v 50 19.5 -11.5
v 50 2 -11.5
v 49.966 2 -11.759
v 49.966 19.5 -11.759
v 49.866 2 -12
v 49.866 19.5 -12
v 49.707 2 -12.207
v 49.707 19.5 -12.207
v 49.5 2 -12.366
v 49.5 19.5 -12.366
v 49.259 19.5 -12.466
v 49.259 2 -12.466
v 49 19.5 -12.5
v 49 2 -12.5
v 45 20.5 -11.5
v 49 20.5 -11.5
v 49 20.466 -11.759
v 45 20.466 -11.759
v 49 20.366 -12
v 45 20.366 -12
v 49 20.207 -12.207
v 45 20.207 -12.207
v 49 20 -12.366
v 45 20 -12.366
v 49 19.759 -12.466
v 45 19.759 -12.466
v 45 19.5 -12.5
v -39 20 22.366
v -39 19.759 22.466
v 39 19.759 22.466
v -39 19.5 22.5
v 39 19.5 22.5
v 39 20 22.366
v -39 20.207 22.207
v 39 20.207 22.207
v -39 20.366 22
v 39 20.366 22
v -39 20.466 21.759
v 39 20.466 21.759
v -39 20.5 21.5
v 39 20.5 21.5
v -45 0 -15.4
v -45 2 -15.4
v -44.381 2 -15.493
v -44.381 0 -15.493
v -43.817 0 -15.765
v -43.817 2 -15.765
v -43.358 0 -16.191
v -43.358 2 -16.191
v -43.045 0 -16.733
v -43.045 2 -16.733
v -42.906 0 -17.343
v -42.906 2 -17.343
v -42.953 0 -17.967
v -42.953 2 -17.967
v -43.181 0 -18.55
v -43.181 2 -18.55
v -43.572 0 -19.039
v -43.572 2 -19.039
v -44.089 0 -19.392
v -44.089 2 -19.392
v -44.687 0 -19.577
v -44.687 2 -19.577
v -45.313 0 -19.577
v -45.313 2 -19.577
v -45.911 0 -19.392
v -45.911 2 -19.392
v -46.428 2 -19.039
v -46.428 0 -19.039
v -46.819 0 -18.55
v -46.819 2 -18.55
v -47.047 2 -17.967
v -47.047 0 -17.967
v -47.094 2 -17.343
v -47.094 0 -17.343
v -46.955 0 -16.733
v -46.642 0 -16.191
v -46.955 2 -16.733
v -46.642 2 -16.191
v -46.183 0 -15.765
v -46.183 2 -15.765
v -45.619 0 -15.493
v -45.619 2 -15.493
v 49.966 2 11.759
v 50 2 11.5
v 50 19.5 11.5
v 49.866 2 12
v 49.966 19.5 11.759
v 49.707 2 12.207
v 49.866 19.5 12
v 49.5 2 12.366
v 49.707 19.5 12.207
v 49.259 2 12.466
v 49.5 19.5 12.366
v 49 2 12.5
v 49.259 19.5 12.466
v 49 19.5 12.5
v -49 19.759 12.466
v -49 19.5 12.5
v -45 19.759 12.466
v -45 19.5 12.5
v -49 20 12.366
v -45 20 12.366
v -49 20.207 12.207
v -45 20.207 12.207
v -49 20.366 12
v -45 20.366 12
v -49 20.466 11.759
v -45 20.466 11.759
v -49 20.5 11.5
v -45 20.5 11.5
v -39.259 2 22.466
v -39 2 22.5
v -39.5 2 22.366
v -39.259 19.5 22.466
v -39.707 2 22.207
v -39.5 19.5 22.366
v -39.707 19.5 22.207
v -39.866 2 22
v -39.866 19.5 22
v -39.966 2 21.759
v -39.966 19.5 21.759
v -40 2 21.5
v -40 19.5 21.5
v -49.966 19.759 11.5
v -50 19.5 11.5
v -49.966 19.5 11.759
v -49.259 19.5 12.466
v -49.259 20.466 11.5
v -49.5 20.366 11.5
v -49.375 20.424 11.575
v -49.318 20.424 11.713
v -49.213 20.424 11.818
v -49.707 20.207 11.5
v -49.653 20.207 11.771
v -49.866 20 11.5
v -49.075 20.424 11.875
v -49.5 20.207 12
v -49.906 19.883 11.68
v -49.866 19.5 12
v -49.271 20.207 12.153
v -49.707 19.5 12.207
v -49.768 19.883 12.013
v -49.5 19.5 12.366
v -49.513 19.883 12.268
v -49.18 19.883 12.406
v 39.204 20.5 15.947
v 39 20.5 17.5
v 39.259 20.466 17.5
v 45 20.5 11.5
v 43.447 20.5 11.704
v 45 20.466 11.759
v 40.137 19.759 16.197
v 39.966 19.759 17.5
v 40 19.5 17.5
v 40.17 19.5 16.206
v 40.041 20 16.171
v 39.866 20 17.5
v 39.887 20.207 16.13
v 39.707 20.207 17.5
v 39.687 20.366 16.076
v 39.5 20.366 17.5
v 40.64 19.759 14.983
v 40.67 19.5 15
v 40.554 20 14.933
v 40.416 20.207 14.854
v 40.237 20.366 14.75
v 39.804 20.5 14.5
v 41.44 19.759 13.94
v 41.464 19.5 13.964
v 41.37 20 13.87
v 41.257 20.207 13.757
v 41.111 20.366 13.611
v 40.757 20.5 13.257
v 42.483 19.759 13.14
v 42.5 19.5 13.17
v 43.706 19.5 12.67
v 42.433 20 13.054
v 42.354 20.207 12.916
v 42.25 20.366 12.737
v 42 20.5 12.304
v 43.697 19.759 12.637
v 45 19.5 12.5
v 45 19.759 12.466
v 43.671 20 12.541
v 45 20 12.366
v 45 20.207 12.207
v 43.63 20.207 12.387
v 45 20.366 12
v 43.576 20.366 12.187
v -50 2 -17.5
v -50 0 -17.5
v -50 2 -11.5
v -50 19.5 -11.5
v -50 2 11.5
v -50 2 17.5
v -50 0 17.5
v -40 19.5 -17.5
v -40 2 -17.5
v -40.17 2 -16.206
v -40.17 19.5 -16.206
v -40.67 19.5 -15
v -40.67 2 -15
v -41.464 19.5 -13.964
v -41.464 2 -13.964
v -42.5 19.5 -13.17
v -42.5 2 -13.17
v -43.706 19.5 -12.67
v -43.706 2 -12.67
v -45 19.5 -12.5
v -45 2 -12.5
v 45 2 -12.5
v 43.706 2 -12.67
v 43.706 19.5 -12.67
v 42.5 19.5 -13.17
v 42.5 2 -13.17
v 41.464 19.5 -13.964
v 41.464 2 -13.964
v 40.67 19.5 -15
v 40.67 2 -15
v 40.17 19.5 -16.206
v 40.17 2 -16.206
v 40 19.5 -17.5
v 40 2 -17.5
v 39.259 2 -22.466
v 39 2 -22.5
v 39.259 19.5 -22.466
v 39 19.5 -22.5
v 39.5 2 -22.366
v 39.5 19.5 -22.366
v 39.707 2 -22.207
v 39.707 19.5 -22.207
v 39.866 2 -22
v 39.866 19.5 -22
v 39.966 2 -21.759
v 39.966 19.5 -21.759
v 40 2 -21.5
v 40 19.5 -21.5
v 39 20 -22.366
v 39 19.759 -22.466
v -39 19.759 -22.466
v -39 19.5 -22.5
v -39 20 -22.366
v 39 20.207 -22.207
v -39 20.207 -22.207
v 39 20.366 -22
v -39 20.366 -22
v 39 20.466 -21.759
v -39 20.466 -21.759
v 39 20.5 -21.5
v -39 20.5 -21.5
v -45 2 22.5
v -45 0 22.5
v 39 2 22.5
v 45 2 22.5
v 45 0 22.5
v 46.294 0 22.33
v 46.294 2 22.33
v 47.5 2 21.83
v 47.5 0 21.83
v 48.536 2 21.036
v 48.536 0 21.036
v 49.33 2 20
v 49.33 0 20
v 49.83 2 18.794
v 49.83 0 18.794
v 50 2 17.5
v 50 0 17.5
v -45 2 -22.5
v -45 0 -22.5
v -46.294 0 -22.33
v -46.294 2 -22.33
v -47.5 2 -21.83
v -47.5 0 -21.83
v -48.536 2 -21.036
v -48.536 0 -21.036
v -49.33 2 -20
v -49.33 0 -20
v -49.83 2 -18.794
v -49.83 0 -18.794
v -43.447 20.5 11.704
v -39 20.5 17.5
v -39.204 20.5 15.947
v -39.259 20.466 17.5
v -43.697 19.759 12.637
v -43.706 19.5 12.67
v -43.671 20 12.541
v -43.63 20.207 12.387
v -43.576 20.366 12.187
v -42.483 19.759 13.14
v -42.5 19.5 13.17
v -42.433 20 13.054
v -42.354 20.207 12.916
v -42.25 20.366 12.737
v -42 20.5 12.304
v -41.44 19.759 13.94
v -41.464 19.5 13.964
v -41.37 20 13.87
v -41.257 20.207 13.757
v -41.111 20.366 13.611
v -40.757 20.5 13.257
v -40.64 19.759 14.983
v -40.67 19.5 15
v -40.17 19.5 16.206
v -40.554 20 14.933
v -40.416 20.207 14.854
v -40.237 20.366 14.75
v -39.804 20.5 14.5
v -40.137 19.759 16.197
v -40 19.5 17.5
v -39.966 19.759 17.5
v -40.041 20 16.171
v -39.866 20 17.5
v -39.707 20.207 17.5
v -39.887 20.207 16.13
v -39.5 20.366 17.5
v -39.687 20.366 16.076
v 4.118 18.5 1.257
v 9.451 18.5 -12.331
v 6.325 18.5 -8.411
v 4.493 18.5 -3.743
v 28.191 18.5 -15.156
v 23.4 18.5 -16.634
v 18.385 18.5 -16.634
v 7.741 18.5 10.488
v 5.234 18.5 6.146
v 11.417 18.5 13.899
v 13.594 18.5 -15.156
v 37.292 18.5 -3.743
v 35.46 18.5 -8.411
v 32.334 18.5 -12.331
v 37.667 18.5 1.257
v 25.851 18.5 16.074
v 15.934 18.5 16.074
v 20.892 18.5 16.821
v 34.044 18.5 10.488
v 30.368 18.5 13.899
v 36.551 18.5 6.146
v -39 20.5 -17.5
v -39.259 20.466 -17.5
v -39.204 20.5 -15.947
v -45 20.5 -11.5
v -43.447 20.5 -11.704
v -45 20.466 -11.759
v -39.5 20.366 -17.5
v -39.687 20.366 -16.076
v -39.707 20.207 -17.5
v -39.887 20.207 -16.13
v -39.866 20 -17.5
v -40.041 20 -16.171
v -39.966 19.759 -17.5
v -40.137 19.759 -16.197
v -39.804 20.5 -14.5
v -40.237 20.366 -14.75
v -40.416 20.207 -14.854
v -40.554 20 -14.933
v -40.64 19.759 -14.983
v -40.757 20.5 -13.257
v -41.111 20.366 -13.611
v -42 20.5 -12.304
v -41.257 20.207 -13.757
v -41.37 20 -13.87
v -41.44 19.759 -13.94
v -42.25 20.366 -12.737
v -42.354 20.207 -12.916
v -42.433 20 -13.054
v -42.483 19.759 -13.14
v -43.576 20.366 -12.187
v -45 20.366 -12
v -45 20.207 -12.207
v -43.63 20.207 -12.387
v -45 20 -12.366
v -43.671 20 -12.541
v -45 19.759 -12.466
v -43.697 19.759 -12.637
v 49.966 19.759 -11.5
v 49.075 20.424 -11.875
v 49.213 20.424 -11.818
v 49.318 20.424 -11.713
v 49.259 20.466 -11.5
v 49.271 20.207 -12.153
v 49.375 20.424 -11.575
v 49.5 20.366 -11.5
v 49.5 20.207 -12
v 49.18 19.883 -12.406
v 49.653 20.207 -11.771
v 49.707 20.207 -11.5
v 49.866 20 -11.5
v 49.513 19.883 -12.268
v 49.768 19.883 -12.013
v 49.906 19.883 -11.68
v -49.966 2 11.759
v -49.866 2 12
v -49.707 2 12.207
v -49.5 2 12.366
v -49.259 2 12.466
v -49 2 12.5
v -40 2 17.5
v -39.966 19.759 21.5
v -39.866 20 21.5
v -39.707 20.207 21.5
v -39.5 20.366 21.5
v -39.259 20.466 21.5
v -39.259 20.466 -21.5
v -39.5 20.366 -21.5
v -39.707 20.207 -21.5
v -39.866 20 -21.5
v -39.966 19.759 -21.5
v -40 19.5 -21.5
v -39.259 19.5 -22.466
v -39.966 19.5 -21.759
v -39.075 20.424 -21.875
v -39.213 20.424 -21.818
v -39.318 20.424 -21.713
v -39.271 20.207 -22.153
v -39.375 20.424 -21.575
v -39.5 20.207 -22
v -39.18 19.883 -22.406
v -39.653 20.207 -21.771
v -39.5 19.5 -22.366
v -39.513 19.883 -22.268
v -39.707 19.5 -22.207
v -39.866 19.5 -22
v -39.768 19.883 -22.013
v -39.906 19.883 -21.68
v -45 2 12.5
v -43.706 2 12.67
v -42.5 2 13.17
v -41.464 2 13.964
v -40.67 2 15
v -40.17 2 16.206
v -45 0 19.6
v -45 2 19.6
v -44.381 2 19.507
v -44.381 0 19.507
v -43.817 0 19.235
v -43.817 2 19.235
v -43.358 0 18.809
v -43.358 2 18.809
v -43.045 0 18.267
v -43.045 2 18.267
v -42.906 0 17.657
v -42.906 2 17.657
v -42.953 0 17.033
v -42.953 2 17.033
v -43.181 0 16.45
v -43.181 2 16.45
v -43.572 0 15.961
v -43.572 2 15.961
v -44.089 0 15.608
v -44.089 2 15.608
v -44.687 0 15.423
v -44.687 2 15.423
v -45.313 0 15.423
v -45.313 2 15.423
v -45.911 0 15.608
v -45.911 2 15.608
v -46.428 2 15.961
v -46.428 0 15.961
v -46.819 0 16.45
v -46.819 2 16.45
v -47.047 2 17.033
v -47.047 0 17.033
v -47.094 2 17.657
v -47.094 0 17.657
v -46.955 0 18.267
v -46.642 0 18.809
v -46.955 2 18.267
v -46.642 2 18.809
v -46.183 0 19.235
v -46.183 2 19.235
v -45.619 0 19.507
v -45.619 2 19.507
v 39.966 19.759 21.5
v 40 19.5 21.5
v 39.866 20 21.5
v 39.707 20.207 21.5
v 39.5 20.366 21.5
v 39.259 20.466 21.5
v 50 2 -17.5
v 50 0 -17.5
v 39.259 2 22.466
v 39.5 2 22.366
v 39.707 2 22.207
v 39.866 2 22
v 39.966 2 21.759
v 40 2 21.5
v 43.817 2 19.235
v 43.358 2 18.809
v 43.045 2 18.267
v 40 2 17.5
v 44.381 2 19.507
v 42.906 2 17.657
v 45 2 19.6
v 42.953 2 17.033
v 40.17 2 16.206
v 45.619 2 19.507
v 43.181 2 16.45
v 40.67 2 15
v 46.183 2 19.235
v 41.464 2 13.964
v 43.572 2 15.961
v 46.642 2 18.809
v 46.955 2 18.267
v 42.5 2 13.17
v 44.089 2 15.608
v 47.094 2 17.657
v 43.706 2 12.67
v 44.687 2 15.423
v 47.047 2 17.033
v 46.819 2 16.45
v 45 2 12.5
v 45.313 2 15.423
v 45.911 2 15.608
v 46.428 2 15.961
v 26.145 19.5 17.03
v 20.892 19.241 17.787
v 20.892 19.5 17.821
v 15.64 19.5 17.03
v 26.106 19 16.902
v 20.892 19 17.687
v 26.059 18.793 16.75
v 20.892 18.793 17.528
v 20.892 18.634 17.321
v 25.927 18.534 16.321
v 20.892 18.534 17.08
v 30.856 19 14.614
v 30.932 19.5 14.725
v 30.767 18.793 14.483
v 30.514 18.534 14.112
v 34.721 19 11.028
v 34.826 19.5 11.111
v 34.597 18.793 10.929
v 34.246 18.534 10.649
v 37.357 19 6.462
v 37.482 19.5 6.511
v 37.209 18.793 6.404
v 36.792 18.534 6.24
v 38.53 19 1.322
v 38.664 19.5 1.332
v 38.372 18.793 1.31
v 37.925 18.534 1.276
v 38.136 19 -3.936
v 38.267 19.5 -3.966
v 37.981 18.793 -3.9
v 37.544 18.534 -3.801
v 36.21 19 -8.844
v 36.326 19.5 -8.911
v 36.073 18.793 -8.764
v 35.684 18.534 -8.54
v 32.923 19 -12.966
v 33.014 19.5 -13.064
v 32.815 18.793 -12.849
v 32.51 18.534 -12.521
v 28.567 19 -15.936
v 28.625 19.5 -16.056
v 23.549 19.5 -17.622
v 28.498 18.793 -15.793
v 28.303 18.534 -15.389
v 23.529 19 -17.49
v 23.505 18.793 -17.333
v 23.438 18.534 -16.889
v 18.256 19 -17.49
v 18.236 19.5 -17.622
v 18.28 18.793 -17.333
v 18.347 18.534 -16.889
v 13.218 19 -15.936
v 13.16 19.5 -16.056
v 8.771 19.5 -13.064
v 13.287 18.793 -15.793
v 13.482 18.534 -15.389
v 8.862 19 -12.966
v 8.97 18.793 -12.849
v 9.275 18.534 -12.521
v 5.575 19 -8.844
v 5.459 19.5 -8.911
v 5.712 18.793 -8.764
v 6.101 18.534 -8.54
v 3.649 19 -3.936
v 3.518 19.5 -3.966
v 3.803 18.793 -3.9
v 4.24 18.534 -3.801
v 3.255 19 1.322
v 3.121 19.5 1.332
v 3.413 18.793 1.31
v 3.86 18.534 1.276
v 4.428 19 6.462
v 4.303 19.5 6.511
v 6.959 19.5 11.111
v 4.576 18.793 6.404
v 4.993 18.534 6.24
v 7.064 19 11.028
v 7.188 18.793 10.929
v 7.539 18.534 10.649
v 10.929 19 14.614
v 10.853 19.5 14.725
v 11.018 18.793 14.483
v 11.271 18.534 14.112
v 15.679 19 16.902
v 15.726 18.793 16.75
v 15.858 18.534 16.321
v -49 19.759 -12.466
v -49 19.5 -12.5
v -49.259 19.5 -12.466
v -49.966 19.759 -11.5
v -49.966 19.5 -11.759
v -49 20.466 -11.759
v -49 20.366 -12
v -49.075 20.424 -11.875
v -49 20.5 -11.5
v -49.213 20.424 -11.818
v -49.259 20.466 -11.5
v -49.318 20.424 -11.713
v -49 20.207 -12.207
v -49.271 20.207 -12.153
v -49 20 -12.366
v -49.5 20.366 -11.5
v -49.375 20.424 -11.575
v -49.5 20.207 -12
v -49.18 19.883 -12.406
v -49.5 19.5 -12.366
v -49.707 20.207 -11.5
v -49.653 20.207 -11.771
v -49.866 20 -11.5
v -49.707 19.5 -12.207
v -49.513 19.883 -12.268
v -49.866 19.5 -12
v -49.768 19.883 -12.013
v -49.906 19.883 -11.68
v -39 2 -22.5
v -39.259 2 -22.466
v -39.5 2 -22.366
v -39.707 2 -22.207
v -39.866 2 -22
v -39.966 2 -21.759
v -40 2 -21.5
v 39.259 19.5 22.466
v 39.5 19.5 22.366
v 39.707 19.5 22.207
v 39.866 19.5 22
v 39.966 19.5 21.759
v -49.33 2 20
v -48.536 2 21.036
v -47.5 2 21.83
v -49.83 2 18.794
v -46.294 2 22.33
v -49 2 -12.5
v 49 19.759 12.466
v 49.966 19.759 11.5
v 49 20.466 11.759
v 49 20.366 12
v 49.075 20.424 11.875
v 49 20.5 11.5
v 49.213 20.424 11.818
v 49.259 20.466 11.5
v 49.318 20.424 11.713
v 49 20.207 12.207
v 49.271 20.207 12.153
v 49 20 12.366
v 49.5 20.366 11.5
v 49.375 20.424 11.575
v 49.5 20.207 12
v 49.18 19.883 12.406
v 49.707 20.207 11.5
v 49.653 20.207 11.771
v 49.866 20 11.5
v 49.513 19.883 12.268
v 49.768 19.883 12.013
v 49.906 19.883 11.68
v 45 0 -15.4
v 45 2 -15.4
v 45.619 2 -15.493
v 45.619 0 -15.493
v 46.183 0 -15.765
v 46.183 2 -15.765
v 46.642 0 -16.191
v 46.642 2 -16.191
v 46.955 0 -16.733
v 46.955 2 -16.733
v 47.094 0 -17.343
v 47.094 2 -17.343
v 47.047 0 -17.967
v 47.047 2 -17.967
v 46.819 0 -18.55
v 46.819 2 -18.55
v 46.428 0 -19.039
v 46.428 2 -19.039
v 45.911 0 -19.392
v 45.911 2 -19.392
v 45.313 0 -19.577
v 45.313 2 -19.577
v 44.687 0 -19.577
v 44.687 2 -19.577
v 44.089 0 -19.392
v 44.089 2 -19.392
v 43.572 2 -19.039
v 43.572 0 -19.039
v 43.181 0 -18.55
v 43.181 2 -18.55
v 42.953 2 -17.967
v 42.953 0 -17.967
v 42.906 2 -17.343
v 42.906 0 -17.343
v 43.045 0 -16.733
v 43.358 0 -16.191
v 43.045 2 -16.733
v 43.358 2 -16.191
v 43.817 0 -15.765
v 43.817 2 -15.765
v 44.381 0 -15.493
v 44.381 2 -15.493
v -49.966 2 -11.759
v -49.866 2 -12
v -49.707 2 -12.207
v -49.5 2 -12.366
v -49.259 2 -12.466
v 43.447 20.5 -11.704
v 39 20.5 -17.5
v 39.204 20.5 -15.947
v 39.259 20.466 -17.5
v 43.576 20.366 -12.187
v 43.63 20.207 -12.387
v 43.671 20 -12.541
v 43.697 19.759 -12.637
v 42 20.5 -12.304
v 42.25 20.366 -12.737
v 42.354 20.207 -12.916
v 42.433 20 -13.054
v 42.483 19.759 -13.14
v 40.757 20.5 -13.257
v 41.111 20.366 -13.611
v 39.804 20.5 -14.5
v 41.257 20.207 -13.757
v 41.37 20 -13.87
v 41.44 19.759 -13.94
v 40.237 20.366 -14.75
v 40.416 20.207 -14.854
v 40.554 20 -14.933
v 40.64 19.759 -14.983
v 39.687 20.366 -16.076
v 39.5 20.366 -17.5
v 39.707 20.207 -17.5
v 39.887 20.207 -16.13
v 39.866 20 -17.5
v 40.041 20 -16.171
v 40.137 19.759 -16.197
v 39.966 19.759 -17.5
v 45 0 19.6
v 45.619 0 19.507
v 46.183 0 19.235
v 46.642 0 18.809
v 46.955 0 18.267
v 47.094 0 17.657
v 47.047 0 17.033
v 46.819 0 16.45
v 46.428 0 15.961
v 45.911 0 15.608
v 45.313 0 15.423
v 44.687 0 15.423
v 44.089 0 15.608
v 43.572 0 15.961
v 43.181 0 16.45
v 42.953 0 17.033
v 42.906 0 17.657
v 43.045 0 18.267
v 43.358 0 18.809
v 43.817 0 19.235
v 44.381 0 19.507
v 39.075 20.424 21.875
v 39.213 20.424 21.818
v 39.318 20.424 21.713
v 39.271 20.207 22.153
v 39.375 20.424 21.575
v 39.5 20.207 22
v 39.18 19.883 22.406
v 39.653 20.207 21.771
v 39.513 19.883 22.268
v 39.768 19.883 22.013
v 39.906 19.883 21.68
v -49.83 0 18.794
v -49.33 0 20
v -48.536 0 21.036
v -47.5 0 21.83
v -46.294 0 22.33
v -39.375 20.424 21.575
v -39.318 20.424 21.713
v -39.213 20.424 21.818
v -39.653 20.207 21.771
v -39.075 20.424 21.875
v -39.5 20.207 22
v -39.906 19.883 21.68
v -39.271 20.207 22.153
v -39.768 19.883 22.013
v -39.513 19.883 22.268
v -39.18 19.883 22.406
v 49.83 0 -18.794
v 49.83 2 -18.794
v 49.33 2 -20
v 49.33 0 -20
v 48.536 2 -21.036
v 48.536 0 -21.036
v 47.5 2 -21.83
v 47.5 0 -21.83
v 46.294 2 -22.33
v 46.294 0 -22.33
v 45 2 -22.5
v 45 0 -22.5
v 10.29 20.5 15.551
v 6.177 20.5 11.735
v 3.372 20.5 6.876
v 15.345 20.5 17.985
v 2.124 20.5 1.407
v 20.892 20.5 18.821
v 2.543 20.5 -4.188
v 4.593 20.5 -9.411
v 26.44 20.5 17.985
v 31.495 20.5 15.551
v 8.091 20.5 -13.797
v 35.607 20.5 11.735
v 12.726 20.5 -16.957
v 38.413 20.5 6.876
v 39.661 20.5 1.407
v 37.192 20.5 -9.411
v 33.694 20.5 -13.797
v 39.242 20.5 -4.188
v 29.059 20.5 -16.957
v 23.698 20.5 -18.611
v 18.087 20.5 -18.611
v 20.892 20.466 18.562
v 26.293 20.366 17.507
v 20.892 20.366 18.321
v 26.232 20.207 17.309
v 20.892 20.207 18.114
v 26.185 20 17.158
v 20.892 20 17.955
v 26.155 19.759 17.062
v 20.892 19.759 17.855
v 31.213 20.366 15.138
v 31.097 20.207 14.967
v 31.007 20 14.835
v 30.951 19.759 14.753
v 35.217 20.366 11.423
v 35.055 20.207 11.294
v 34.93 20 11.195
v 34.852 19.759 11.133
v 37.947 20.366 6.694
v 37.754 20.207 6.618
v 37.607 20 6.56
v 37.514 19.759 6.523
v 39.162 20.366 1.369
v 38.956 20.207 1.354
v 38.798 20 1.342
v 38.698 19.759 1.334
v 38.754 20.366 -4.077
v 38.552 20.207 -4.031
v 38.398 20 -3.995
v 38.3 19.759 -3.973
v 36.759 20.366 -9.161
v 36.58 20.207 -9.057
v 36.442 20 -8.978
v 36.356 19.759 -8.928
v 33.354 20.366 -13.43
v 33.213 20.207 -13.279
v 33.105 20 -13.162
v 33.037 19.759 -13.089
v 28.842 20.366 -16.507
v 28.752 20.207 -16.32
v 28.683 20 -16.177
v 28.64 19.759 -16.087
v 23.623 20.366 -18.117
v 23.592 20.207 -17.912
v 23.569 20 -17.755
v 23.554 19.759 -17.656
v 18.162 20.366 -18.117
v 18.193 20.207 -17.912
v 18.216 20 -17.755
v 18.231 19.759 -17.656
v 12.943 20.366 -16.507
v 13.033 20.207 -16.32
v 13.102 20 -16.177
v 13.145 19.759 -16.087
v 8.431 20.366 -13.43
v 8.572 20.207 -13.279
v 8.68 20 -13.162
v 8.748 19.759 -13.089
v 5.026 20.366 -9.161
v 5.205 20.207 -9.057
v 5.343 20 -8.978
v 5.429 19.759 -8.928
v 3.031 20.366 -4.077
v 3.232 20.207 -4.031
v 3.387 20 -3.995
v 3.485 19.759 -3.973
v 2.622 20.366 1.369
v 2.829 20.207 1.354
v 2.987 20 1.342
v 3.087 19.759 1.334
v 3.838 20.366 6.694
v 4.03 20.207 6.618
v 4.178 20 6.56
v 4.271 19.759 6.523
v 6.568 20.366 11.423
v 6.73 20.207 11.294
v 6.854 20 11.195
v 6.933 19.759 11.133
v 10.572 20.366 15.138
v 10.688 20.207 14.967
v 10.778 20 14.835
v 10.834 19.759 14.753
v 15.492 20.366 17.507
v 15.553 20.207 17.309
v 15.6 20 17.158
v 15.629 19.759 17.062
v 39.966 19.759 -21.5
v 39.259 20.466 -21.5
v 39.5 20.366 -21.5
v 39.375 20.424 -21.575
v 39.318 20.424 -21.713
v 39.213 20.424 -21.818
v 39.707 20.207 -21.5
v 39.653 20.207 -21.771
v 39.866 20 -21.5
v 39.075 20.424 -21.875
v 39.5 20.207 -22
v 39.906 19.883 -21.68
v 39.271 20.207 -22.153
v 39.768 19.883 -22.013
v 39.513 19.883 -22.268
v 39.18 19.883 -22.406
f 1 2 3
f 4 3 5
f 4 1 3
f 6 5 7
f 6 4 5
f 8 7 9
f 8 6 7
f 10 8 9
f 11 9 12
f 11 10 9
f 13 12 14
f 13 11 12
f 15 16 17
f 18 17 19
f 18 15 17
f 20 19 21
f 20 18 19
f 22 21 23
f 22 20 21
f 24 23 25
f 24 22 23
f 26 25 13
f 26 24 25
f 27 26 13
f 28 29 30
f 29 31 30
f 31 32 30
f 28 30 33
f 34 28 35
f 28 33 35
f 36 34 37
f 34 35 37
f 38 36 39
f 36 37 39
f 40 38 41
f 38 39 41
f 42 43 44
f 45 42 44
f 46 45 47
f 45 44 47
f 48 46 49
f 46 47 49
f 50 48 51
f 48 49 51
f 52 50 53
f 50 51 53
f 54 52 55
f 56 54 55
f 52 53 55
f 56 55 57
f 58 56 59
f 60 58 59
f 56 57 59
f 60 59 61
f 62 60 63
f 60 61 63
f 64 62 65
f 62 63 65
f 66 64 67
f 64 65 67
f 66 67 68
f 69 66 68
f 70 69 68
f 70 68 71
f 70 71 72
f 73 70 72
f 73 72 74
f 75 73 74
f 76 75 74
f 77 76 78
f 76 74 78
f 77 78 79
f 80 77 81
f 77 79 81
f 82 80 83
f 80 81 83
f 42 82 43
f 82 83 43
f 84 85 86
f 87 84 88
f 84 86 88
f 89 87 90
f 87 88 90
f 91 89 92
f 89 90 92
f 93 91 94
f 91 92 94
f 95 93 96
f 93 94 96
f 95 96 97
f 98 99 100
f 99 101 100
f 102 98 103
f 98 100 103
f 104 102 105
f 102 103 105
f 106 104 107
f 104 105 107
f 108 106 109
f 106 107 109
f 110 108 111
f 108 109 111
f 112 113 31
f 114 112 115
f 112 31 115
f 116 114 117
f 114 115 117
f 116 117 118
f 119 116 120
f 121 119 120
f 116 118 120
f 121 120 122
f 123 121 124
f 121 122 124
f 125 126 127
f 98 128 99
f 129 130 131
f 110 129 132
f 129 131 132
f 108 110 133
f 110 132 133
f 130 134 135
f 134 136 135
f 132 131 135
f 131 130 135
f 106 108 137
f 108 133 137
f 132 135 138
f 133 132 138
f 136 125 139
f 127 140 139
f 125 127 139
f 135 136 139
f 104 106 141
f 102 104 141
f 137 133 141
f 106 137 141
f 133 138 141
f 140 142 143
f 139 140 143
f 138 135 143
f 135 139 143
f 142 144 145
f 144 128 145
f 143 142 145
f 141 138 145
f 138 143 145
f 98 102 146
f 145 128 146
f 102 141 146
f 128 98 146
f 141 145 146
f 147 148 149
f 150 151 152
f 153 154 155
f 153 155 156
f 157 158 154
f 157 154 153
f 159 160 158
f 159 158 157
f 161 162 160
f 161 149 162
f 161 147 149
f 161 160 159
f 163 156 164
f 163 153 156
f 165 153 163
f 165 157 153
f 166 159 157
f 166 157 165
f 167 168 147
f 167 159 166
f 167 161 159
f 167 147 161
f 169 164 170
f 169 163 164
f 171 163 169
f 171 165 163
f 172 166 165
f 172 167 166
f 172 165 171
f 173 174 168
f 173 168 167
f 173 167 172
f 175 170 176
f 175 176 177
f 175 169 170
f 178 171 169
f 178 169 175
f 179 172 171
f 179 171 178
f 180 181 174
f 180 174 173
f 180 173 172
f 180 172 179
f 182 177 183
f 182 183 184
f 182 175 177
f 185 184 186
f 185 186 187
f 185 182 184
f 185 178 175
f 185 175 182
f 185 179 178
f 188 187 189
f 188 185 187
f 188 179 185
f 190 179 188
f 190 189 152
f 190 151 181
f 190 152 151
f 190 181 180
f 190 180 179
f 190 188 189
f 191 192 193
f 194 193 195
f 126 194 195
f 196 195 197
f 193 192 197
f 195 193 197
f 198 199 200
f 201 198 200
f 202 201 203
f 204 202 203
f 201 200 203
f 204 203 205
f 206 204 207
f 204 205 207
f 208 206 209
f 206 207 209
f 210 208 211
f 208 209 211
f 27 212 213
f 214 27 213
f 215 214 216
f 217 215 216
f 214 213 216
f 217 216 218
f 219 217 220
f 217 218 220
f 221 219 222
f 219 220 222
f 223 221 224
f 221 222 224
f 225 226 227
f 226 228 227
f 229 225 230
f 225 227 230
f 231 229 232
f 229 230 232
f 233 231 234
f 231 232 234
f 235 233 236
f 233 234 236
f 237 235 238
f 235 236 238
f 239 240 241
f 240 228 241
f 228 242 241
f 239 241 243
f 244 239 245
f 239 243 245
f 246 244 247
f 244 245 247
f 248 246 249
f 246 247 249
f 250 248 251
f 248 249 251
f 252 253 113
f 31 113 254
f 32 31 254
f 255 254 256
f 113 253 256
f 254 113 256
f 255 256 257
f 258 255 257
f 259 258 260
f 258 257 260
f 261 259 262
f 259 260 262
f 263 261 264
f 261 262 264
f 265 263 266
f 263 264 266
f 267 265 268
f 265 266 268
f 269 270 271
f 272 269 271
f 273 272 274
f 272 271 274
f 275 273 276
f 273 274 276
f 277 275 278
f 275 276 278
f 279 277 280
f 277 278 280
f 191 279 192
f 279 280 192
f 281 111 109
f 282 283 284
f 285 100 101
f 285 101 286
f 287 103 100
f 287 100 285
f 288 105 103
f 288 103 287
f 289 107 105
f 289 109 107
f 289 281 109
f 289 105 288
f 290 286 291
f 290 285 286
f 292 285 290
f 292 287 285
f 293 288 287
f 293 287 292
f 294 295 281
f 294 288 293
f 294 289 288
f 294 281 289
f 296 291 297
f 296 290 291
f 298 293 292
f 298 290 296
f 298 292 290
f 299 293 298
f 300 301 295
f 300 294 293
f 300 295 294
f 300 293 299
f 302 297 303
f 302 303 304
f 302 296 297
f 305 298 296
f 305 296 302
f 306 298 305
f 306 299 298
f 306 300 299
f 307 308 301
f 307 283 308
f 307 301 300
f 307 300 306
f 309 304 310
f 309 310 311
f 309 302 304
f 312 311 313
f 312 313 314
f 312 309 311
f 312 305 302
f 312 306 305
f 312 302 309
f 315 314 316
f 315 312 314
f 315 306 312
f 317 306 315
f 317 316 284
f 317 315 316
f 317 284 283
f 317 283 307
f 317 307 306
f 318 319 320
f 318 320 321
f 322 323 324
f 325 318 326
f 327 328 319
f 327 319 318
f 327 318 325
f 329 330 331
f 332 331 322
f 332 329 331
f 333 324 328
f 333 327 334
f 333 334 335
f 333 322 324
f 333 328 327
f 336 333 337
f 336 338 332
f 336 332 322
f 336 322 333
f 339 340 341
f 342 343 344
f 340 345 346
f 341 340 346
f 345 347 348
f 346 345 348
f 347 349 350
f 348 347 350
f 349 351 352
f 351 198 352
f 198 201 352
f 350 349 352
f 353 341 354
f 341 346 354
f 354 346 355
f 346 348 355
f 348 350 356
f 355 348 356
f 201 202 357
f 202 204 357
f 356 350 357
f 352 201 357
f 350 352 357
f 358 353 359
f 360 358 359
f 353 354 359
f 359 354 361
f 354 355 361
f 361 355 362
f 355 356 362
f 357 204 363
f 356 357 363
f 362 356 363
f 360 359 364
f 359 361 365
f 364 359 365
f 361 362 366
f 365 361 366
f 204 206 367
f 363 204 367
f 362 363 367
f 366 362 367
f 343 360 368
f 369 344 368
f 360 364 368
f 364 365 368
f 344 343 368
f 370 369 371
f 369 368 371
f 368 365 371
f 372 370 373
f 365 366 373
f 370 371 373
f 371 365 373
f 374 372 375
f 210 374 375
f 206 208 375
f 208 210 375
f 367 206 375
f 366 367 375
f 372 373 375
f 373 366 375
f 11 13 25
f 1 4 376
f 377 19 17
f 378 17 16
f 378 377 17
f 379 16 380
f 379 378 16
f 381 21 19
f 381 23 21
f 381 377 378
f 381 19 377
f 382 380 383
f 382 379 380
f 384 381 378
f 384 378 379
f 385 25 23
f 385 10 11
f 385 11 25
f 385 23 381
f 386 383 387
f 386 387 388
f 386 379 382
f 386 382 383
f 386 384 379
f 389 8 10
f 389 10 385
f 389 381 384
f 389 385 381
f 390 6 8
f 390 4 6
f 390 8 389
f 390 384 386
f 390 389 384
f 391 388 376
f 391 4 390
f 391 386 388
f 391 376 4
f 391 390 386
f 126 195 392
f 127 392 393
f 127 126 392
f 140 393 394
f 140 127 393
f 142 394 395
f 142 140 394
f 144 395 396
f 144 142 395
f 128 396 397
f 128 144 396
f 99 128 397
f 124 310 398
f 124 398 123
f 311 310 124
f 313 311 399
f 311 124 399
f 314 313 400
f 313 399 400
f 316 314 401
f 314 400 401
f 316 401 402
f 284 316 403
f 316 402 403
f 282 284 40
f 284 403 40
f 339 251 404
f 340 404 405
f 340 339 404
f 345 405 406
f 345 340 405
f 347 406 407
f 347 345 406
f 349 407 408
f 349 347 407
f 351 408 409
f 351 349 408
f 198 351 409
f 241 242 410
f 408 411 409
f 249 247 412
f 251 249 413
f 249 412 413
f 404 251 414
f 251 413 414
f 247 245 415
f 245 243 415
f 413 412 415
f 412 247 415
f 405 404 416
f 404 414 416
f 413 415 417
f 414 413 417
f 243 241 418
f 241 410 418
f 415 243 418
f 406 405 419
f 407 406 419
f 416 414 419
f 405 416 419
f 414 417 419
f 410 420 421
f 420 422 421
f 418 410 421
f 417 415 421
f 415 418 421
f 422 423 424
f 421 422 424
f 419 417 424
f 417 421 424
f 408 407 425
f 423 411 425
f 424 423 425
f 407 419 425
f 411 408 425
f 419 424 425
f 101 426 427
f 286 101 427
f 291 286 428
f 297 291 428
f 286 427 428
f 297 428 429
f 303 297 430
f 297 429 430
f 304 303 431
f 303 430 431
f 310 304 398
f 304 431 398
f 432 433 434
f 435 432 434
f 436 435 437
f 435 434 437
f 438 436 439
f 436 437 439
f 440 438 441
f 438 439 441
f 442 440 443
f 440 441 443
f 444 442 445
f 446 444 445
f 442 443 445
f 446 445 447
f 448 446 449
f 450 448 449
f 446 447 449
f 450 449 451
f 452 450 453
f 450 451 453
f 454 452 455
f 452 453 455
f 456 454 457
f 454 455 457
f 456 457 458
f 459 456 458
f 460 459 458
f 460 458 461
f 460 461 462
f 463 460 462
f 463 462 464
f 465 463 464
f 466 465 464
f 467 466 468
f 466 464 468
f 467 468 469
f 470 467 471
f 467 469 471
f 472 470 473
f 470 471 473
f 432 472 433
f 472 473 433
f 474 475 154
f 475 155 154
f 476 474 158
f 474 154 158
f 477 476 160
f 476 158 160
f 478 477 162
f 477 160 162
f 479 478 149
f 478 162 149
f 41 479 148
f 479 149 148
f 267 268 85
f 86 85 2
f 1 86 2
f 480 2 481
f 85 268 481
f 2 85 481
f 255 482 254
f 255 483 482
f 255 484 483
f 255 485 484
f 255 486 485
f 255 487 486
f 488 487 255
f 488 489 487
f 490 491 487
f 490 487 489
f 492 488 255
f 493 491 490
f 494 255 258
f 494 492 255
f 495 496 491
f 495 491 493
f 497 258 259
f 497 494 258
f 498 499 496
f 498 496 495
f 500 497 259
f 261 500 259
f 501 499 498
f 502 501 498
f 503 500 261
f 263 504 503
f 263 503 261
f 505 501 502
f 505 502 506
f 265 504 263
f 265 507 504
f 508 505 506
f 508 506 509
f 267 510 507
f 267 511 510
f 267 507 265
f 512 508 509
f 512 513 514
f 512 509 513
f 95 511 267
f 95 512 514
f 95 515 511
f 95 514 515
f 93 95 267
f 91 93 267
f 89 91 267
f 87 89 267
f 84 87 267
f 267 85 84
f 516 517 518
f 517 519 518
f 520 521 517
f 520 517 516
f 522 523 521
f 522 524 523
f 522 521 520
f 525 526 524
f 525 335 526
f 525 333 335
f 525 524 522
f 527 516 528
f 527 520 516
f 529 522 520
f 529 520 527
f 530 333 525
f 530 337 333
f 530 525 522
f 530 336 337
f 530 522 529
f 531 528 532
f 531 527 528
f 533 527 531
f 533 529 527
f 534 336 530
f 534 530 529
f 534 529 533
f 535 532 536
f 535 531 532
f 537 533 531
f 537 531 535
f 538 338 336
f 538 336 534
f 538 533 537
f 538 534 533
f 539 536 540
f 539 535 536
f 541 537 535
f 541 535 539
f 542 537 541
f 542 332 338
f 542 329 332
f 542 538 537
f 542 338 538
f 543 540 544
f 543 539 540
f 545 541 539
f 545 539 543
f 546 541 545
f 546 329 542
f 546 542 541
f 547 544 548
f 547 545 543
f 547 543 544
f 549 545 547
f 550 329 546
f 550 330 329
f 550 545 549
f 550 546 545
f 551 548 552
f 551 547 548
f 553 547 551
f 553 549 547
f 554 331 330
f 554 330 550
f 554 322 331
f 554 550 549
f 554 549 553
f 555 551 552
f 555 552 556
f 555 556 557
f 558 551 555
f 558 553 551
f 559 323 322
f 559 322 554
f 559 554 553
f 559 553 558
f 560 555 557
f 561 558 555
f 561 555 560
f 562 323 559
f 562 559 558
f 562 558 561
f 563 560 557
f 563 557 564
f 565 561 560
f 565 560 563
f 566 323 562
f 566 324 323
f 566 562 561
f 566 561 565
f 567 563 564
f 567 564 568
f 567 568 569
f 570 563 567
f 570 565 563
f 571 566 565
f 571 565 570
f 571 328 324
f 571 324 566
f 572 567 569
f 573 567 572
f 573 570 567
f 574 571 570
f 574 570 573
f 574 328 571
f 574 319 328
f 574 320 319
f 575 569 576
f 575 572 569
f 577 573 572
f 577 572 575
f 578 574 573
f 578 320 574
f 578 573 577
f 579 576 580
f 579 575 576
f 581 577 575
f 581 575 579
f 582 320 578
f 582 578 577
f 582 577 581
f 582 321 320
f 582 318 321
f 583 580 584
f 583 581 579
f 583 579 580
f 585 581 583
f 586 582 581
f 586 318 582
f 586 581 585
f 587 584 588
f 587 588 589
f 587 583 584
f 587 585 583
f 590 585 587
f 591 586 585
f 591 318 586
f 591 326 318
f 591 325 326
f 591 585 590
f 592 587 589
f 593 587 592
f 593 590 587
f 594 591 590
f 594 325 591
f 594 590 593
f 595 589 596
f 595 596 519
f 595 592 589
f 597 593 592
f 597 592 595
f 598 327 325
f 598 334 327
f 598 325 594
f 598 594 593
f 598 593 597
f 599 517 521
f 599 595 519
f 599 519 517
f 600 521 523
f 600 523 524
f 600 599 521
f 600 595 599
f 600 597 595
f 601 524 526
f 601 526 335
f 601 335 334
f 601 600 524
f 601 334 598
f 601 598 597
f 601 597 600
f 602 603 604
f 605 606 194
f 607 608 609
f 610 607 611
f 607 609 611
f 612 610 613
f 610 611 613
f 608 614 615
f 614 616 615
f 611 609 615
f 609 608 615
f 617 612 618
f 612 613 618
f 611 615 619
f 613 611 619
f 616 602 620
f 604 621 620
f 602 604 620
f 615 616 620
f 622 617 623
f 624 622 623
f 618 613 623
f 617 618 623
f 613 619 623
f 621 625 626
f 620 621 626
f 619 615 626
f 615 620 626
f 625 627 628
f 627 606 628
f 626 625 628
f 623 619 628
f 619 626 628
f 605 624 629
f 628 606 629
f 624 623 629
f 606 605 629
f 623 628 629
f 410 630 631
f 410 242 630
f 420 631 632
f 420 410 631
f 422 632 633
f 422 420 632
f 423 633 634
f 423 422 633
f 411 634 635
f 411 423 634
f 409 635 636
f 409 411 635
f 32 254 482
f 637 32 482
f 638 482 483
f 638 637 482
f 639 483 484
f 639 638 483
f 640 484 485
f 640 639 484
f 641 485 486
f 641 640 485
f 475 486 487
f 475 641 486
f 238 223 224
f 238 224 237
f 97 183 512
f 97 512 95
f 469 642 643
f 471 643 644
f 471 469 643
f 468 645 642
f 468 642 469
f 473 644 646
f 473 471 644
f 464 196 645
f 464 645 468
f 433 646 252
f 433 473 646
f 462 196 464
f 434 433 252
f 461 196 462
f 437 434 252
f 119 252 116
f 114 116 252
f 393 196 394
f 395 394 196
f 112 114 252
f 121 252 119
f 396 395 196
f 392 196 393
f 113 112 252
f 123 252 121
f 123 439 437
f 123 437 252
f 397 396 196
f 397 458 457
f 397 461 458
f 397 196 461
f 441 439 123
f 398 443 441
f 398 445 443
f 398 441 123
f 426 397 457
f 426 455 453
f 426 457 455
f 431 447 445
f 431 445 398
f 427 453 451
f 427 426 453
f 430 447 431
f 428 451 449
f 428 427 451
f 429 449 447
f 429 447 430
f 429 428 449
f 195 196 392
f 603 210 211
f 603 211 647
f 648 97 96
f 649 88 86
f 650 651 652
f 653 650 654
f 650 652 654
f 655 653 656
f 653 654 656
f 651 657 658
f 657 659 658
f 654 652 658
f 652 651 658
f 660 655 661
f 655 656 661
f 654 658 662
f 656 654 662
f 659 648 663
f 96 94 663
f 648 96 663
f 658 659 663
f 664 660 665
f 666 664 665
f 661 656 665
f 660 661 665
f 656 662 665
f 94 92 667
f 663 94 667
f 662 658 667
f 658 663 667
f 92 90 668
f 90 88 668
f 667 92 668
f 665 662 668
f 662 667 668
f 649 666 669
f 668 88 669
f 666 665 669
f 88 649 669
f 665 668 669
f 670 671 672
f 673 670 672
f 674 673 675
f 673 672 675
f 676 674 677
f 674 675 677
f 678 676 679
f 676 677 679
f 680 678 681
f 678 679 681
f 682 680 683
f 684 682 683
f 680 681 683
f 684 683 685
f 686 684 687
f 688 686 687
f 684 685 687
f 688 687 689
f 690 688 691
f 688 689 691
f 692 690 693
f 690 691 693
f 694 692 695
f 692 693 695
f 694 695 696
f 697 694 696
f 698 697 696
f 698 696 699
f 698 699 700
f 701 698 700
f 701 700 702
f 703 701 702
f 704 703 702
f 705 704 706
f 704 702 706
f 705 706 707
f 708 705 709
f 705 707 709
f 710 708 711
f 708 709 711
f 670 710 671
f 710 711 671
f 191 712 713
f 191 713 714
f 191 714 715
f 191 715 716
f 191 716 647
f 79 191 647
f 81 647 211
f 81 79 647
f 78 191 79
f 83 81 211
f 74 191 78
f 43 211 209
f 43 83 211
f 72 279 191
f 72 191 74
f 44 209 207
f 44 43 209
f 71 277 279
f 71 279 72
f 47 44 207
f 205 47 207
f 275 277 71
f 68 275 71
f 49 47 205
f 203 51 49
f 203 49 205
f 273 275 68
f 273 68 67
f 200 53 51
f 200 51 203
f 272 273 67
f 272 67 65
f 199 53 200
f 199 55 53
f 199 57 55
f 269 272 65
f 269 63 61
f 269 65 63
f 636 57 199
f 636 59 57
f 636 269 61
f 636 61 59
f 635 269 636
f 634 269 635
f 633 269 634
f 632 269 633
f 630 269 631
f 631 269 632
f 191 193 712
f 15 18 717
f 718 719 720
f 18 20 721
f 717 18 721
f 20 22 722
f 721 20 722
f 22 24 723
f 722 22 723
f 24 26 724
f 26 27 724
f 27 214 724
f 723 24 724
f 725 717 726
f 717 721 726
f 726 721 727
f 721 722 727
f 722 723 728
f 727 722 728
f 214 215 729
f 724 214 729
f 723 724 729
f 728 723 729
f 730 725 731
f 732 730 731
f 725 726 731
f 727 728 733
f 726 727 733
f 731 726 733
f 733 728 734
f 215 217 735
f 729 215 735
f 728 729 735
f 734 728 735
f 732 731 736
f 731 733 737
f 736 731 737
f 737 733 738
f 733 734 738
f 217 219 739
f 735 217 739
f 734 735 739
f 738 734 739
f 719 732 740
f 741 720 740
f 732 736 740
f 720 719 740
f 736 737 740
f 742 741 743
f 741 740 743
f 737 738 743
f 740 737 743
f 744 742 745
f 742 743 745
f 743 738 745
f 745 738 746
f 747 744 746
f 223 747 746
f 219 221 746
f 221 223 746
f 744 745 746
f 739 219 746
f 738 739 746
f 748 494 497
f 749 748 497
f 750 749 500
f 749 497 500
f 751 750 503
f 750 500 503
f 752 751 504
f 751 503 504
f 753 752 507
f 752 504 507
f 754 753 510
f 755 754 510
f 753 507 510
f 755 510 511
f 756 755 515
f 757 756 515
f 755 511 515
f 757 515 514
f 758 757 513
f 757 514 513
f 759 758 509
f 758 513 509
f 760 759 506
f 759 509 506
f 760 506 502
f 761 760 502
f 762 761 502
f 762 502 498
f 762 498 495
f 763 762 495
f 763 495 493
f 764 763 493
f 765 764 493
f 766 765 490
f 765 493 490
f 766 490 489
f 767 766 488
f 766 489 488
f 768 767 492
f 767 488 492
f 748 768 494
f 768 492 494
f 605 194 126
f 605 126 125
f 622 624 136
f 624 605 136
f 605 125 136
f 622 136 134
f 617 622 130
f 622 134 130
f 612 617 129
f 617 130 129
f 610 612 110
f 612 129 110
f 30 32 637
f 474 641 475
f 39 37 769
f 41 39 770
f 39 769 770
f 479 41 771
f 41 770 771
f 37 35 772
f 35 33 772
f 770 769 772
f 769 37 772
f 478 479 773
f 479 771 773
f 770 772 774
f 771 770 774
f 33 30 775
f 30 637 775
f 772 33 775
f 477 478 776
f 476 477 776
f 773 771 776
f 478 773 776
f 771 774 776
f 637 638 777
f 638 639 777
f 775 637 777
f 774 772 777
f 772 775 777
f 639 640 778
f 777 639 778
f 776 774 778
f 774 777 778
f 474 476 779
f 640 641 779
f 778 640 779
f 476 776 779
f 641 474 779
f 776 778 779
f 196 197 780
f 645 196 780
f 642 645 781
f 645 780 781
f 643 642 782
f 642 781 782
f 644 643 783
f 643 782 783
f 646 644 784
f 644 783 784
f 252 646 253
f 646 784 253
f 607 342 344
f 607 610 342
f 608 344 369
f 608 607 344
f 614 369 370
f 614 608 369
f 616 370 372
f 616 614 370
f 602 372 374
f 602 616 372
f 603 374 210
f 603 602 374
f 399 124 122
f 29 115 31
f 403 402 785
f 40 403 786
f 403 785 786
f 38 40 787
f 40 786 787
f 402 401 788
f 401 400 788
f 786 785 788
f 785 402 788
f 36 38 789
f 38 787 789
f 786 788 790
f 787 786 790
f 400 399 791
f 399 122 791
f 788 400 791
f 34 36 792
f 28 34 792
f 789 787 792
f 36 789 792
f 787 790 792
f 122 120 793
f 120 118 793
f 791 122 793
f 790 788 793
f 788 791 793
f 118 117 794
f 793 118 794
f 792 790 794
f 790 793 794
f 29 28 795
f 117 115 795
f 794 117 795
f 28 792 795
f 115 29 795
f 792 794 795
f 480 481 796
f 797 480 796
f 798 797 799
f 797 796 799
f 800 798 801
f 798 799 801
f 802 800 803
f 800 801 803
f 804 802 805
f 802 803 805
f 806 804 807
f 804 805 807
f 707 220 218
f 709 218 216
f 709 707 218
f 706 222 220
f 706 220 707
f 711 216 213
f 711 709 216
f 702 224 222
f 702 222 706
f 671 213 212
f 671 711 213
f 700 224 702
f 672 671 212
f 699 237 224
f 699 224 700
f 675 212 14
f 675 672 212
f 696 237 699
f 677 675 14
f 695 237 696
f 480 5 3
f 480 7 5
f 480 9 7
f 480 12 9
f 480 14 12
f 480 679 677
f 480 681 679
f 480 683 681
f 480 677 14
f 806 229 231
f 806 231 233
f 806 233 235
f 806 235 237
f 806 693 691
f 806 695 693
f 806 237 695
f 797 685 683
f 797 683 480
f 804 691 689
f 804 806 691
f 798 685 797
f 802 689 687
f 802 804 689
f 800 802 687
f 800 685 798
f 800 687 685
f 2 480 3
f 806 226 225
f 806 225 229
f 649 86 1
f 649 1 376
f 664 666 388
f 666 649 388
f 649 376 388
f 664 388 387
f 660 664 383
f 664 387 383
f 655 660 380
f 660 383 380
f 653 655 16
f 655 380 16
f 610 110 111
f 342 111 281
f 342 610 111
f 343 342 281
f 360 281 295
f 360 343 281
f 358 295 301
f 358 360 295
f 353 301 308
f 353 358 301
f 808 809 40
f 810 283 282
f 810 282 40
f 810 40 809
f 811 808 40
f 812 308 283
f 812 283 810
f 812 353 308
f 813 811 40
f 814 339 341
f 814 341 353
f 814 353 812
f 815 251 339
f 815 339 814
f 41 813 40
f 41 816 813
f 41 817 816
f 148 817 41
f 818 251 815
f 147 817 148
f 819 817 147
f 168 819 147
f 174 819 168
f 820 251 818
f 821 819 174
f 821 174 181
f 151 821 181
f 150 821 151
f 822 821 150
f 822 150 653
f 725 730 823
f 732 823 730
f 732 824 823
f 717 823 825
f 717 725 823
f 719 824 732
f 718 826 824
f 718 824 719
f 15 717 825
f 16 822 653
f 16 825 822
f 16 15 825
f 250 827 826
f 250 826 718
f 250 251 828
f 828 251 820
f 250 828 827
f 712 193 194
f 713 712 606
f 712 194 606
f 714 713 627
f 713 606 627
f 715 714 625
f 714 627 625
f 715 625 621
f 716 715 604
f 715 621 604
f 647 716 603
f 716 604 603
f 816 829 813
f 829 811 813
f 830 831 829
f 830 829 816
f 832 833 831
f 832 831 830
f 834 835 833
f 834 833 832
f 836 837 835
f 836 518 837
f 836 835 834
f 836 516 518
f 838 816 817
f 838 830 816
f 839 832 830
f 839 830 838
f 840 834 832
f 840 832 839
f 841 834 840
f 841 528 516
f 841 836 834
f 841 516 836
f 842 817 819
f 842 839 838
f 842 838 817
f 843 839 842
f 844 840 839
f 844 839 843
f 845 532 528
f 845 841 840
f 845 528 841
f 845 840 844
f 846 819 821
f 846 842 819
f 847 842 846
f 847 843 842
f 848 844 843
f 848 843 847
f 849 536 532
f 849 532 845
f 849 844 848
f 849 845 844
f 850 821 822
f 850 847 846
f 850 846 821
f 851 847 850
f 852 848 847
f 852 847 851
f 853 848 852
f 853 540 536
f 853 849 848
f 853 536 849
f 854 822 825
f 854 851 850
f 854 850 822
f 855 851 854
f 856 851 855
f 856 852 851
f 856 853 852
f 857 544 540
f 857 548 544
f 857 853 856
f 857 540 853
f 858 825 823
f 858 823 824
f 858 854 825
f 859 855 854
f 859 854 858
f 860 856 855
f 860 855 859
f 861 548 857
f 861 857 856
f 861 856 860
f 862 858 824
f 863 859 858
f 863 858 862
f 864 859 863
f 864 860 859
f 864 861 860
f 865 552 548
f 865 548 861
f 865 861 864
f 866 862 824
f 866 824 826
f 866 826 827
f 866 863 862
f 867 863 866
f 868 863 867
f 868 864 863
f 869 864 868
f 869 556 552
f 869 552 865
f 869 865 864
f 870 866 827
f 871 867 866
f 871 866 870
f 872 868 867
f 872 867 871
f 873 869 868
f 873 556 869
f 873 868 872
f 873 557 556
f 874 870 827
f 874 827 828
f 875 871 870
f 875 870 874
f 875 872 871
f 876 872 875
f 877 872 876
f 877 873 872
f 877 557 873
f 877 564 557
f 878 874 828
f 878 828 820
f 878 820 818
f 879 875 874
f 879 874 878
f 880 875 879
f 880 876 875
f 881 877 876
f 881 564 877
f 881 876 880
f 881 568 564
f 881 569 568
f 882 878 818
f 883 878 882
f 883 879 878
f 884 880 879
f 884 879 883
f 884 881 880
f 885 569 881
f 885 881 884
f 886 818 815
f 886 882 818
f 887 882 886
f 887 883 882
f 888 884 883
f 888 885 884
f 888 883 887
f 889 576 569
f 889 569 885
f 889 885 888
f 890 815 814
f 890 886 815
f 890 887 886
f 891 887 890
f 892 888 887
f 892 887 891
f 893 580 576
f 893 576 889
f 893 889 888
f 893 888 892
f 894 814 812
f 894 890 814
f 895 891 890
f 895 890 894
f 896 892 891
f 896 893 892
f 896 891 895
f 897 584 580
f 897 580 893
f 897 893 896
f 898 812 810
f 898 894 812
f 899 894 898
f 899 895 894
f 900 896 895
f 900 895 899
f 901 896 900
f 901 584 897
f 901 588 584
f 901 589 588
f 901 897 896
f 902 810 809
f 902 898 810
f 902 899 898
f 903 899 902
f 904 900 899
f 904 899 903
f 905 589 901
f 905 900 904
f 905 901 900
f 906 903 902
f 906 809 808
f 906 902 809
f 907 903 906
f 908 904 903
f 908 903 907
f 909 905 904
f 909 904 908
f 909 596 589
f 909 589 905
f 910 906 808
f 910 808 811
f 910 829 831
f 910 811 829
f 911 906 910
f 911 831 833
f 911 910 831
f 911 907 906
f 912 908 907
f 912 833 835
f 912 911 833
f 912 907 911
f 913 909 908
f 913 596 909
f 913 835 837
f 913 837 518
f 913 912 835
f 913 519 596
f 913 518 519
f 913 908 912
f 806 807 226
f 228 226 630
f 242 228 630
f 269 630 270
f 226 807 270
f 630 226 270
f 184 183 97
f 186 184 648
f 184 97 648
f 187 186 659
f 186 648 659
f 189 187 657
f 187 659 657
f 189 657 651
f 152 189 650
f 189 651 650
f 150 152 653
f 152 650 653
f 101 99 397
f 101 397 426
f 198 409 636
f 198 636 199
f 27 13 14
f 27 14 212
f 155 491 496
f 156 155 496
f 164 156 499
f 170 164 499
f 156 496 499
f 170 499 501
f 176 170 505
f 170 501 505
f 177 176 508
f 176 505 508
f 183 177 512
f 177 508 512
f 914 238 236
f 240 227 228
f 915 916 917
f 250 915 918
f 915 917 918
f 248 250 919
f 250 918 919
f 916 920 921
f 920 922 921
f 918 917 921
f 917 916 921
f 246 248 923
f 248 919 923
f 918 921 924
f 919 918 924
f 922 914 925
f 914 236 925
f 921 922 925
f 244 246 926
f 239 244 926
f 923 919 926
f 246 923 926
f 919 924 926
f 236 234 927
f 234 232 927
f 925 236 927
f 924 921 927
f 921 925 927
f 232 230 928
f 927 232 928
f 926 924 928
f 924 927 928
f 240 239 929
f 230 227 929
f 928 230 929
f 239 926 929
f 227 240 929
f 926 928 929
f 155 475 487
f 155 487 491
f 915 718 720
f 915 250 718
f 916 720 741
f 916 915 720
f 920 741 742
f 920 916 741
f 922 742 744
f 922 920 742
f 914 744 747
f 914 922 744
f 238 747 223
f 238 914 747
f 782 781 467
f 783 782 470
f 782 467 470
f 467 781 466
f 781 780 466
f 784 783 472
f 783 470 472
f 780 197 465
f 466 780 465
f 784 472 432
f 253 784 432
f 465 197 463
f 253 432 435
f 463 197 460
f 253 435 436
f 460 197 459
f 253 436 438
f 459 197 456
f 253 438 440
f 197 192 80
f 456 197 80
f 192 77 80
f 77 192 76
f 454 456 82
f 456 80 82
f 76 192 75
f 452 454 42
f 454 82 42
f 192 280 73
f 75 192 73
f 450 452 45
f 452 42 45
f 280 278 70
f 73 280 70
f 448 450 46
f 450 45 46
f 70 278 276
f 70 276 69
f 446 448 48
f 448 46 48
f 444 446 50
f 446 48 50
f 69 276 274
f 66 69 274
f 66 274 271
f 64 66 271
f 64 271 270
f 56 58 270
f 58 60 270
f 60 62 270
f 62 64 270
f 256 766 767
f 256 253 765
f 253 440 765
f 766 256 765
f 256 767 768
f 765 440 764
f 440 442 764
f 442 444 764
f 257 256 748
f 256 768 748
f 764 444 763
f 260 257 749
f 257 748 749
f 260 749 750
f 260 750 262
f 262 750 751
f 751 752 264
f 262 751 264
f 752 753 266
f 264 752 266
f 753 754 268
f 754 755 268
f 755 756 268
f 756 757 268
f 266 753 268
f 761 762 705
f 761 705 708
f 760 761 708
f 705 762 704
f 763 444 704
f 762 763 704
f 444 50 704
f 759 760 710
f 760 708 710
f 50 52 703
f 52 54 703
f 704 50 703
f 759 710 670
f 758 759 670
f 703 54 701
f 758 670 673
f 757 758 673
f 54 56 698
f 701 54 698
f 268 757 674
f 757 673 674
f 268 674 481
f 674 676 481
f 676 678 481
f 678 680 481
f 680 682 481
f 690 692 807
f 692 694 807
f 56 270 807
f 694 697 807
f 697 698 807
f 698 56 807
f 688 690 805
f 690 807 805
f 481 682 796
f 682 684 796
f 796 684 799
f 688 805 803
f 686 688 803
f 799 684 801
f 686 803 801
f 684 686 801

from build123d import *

# Parameters (mm, degrees)
EXTRUDE_1_DEPTH     = 2
EXTRUDE_3_DEPTH     = 18.5
FILLET_1_R          = 1
SKETCH_4_R          = 17.821315346
CUT_EXTRUDE_1_DEPTH = 2
FILLET_2_R          = 1
SKETCH_5_R          = 2.1
CUT_EXTRUDE_2_DEPTH = 2


with BuildPart() as part:
    # 草图1 → 凸台-拉伸1 (new body)
    with BuildSketch(Plane(origin=(0, 0, 0), x_dir=(1, 0, 0), z_dir=(0, 1, 0))):
        with BuildLine():
            Line((-45, -22.5), (45, -22.5))
            ThreePointArc((45, -22.5), (48.535533906, -21.035533906), (50, -17.5))
            Line((50, -17.5), (50, 17.5))
            ThreePointArc((50, 17.5), (48.535533906, 21.035533906), (45, 22.5))
            Line((45, 22.5), (-45, 22.5))
            ThreePointArc((-45, 22.5), (-48.535533906, 21.035533906), (-50, 17.5))
            Line((-50, 17.5), (-50, -17.5))
            ThreePointArc((-50, -17.5), (-48.535533906, -21.035533906), (-45, -22.5))
        make_face()
    extrude(amount=EXTRUDE_1_DEPTH)

    # 草图2 → 凸台-拉伸3 (add)
    with BuildSketch(Plane(origin=(0, 2, 0), x_dir=(1, 0, 0), z_dir=(0, 1, 0))):
        with BuildLine():
            Line((-40, 22.5), (-40, 17.5))
            ThreePointArc((-40, 17.5), (-41.464466094, 13.964466094), (-45, 12.5))
            Line((-45, 12.5), (-50, 12.5))
            Line((-50, 12.5), (-50, -12.5))
            Line((-50, -12.5), (-45, -12.5))
            ThreePointArc((-45, -12.5), (-41.464466094, -13.964466094), (-40, -17.5))
            Line((-40, -17.5), (-40, -22.5))
            Line((-40, -22.5), (40, -22.5))
            Line((40, -22.5), (40, -17.5))
            ThreePointArc((40, -17.5), (41.464466094, -13.964466094), (45, -12.5))
            Line((45, -12.5), (50, -12.5))
            Line((50, -12.5), (50, 12.5))
            Line((50, 12.5), (45, 12.5))
            ThreePointArc((45, 12.5), (41.464466094, 13.964466094), (40, 17.5))
            Line((40, 17.5), (40, 22.5))
            Line((40, 22.5), (-40, 22.5))
        make_face()
    extrude(amount=EXTRUDE_3_DEPTH)

    # 圆角1
    fillet_1_edges = [part.edges().sort_by_distance(p)[0] for p in [
        (40, 11.25, -22.5),
        (-40, 11.25, -22.5),
        (-50, 11.25, -12.5),
        (-50, 11.25, 12.5),
        (-40, 11.25, 22.5),
        (40, 11.25, 22.5),
        (50, 11.25, 12.5),
        (50, 11.25, -12.5),
        (41.464466094, 20.5, -13.964466094),
        (40, 20.5, -20),
        (0, 20.5, -22.5),
        (-40, 20.5, -20),
        (-41.464466094, 20.5, -13.964466094),
        (-47.5, 20.5, -12.5),
        (-50, 20.5, 0),
        (-47.5, 20.5, 12.5),
        (-41.464466094, 20.5, 13.964466094),
        (-40, 20.5, 20),
        (0, 20.5, 22.5),
        (40, 20.5, 20),
        (41.464466094, 20.5, 13.964466094),
        (47.5, 20.5, 12.5),
        (50, 20.5, 0),
        (47.5, 20.5, -12.5),
    ]]
    fillet(fillet_1_edges, radius=FILLET_1_R)

    # 草图4 → 切除-拉伸1 (cut)
    with BuildSketch(Plane(origin=(0, 20.5, 0), x_dir=(1, 0, 0), z_dir=(0, 1, 0))):
        with Locations(Location((20.892434564, 0, 0), (0, 0, 270))):
            Circle(SKETCH_4_R)
    extrude(amount=-CUT_EXTRUDE_1_DEPTH, mode=Mode.SUBTRACT)

    # 圆角2
    fillet_2_edges = [part.edges().sort_by_distance(p)[0] for p in [
        (20.892434564, 18.5, -17.821315346),
        (20.892434564, 20.5, -17.821315346),
    ]]
    fillet(fillet_2_edges, radius=FILLET_2_R - 0.0001)  # a hair under: the kernel refuses the full size

    # 草图5 → 切除-拉伸2 (cut)
    with BuildSketch(Plane(origin=(0, 2, 0), x_dir=(1, 0, 0), z_dir=(0, 1, 0))):
        with Locations(Location((-45, 17.5, 0), (0, 0, 270))):
            Circle(SKETCH_5_R)
        with Locations(Location((45, 17.5, 0), (0, 0, 270))):
            Circle(SKETCH_5_R)
        with Locations(Location((45, -17.5, 0), (0, 0, 270))):
            Circle(SKETCH_5_R)
        with Locations(Location((-45, -17.5, 0), (0, 0, 270))):
            Circle(SKETCH_5_R)
    extrude(amount=-CUT_EXTRUDE_2_DEPTH, mode=Mode.SUBTRACT)


solid = part.part
